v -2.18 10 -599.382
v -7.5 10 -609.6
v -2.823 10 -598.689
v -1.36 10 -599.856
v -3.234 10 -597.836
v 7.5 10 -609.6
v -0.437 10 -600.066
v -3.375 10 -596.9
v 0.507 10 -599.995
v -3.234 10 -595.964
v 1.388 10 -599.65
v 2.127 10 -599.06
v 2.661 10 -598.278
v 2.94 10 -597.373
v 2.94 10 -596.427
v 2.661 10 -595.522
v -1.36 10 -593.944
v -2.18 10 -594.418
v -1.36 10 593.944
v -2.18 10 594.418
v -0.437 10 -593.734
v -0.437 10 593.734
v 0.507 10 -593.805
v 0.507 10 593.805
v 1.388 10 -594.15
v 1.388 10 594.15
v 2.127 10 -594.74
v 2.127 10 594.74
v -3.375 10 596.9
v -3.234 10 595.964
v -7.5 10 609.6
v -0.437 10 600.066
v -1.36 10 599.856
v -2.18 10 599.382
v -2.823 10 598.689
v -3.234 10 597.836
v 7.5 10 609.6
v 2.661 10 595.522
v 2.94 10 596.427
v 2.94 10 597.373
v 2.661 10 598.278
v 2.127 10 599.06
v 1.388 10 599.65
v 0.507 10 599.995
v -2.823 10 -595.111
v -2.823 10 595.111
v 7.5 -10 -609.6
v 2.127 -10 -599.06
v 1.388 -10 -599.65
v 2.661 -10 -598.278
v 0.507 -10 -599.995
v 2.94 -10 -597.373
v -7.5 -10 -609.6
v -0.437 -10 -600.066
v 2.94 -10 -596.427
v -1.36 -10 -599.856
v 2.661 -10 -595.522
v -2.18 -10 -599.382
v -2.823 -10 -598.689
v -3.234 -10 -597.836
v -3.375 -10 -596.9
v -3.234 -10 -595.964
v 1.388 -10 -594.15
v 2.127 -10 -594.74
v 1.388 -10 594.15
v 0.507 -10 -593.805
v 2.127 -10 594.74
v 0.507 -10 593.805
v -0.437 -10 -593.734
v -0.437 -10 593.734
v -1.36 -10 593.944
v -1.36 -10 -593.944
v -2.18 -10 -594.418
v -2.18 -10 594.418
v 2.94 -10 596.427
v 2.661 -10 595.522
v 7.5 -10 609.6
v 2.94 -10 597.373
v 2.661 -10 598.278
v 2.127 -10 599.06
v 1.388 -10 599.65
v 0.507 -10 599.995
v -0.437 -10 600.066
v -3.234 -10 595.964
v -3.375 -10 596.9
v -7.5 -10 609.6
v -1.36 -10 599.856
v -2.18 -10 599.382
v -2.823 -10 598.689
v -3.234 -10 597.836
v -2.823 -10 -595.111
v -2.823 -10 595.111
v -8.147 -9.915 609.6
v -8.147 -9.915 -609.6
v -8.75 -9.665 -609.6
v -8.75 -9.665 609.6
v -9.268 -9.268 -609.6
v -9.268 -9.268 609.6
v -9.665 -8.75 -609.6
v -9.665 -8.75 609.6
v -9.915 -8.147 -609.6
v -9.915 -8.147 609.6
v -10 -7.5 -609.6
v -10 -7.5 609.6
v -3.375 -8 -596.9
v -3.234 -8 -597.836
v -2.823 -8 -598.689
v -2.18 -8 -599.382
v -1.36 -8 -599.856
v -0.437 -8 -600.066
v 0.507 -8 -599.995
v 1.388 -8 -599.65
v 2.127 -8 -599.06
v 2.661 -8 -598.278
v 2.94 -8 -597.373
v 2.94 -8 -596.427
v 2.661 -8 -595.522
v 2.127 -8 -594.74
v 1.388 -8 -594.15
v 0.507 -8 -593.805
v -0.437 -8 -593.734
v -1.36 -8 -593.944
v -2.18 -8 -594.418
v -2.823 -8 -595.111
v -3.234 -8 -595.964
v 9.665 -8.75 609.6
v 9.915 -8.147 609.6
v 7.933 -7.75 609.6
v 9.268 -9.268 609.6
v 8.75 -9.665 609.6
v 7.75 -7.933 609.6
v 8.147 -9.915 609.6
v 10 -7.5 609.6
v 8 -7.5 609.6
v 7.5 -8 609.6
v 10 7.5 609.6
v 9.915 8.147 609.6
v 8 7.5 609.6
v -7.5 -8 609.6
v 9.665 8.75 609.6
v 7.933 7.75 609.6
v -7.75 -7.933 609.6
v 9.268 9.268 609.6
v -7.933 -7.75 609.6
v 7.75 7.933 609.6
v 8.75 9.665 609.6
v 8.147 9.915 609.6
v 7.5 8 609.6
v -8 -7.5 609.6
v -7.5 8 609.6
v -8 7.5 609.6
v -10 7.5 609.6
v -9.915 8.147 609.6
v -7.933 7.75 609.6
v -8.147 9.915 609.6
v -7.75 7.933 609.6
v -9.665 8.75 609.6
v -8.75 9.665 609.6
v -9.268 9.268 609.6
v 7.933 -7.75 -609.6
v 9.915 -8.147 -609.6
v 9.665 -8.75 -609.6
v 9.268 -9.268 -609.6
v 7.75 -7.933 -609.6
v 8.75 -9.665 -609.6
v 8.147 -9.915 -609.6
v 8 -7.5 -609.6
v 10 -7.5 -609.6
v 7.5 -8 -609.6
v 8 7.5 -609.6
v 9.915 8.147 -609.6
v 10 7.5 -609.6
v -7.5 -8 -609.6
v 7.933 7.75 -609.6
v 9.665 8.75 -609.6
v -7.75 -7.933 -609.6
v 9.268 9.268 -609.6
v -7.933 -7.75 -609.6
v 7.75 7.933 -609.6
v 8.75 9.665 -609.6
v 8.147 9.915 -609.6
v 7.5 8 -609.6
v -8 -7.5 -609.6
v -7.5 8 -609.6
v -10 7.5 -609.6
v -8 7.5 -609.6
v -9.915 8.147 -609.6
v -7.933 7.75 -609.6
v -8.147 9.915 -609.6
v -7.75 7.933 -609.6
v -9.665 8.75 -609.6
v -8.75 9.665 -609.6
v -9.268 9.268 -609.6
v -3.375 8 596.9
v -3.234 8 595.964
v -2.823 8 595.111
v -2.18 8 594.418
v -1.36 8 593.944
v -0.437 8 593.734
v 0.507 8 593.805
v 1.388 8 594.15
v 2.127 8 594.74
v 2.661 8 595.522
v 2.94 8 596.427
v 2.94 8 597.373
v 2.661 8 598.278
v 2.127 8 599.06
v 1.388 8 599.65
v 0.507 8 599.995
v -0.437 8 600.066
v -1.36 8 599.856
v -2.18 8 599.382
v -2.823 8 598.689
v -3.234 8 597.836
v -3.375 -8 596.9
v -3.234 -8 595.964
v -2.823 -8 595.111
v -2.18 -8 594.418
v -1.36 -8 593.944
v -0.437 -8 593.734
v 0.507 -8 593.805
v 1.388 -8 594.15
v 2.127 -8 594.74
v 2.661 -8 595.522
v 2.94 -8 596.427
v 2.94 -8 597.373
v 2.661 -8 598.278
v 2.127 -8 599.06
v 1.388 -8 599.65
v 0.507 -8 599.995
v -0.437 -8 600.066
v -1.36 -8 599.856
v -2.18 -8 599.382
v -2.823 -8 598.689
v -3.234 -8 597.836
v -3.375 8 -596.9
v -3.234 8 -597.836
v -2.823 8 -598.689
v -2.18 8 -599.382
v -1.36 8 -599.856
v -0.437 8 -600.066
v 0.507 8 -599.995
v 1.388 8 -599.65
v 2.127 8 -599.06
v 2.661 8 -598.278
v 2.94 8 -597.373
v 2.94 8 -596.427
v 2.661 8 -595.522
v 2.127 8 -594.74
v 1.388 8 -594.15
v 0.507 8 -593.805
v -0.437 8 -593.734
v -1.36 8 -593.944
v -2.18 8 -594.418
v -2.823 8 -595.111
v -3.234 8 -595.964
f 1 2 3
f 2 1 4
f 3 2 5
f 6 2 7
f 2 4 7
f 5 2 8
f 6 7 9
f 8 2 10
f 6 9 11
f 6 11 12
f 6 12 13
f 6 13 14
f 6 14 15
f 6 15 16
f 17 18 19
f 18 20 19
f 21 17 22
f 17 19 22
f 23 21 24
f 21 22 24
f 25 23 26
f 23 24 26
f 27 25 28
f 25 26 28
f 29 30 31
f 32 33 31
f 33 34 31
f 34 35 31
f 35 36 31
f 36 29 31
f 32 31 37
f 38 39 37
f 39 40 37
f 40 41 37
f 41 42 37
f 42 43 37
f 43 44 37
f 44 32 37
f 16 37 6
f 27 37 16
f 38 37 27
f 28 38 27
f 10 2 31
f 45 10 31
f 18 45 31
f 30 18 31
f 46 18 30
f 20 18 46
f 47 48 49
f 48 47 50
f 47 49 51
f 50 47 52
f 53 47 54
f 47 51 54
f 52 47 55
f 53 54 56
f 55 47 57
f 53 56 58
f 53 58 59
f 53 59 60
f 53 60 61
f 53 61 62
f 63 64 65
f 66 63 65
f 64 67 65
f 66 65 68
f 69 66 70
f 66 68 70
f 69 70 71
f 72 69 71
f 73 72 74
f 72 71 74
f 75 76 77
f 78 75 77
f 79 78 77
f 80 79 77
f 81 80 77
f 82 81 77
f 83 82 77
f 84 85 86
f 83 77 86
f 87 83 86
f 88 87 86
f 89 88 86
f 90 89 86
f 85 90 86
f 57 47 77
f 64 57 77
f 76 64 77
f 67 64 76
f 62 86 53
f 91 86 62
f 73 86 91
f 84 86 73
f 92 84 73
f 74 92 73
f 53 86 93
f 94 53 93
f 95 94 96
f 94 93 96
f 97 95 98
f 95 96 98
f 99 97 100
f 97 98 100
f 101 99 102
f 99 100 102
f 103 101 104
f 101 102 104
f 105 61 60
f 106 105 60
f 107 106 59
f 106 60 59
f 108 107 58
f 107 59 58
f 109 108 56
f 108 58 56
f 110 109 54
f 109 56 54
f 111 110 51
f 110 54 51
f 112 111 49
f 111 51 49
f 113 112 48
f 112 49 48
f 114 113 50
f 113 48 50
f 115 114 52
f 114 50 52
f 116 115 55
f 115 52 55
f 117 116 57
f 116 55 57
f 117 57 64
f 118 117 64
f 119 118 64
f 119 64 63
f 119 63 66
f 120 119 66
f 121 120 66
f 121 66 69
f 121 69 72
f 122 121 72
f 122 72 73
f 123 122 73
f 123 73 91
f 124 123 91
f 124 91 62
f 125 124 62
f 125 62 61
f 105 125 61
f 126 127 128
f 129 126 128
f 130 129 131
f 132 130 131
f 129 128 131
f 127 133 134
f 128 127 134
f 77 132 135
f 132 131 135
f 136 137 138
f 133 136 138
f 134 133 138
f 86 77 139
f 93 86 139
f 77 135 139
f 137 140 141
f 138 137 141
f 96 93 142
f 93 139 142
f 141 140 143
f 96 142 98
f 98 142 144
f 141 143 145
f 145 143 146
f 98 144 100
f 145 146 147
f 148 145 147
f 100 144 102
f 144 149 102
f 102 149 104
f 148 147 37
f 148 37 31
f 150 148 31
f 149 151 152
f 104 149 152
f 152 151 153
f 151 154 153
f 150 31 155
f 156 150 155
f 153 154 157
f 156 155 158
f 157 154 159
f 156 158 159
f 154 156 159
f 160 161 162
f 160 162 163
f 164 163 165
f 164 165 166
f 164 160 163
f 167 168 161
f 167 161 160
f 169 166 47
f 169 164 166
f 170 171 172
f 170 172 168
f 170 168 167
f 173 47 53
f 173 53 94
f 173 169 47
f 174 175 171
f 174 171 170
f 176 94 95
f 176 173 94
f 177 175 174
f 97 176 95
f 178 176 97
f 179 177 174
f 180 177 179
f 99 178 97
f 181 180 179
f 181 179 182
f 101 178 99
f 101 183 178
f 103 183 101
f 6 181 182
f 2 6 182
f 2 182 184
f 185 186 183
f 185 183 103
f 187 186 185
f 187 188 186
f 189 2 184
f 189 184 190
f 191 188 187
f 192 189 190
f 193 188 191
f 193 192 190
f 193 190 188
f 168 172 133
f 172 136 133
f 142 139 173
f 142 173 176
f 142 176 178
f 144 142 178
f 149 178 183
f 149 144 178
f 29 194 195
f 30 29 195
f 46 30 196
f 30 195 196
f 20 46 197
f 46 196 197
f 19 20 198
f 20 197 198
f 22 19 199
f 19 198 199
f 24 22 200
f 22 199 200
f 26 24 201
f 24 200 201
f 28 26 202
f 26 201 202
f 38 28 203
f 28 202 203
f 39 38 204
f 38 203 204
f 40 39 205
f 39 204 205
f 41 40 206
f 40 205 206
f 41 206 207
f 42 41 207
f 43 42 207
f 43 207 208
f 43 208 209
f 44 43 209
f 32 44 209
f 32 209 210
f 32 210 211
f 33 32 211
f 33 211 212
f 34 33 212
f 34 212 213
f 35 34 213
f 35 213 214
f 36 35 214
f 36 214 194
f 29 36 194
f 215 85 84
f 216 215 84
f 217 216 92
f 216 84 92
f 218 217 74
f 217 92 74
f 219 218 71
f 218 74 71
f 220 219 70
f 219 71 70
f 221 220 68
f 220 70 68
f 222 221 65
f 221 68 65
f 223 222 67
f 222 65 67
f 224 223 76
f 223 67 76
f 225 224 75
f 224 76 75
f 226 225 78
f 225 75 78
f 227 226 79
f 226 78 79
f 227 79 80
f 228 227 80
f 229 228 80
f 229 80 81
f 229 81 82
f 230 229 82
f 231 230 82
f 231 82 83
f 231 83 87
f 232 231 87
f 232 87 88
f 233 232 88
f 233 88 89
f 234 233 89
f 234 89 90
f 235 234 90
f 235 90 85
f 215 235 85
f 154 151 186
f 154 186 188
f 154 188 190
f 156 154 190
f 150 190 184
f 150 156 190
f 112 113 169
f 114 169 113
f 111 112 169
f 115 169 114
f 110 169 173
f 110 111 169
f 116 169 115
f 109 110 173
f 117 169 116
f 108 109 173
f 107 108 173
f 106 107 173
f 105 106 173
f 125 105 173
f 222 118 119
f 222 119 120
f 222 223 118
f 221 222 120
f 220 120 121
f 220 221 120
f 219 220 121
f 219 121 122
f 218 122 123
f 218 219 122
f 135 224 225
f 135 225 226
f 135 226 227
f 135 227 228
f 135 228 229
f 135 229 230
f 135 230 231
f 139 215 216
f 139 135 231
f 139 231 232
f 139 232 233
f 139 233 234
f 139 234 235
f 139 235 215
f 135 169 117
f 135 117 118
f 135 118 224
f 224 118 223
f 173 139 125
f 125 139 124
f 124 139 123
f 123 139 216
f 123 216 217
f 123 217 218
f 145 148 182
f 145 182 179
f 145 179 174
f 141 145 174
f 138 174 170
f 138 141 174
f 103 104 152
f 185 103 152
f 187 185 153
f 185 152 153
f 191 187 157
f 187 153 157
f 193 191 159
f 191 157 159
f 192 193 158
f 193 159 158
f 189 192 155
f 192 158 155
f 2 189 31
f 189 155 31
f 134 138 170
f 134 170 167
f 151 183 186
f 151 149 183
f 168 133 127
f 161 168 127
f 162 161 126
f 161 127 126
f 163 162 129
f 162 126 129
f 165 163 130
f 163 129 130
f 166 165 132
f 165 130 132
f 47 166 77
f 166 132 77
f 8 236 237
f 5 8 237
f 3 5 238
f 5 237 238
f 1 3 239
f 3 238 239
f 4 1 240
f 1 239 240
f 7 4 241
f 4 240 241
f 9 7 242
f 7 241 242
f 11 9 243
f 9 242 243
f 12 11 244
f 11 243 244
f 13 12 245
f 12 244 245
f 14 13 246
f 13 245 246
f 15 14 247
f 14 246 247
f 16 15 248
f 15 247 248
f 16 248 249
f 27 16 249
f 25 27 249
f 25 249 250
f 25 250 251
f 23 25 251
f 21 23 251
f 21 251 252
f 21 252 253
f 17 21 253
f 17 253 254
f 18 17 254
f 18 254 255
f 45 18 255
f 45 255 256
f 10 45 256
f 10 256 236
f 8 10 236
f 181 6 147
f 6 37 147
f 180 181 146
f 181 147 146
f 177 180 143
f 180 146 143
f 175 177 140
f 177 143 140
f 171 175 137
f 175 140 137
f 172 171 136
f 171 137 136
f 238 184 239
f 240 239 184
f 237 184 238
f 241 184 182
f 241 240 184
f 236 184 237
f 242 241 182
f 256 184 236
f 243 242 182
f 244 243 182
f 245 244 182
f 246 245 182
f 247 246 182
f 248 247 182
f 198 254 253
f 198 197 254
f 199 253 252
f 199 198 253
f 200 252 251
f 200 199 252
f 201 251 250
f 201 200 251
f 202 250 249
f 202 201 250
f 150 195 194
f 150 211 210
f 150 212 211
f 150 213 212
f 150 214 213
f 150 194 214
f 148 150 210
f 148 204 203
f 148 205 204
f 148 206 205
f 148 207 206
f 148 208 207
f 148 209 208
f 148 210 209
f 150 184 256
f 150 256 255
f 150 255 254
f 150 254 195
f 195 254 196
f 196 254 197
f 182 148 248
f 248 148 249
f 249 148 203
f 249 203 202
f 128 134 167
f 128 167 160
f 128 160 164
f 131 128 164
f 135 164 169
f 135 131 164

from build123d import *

# Parameters (mm, degrees)
EXTRUDE_THIN1_DEPTH             = 609.6
F_1_4_0_25_DIAMETER_HOLE1_D     = 6.35
F_1_4_0_25_DIAMETER_HOLE1_DEPTH = 25.4
F_1_4_0_25_DIAMETER_HOLE1_TIP   = 1.907732465


with BuildPart() as part:
    # Sketch1 → Extrude-Thin1 (new, symmetric)
    with BuildSketch(Plane.XY):
        with BuildLine():
            Line((-10, -7.5), (-10, 7.5))
            ThreePointArc((-10, 7.5), (-9.267766953, 9.267766953), (-7.5, 10))
            Line((-7.5, 10), (7.5, 10))
            ThreePointArc((7.5, 10), (9.267766953, 9.267766953), (10, 7.5))
            Line((10, 7.5), (10, -7.5))
            ThreePointArc((10, -7.5), (9.267766953, -9.267766953), (7.5, -10))
            Line((7.5, -10), (-7.5, -10))
            ThreePointArc((-7.5, -10), (-9.267766953, -9.267766953), (-10, -7.5))
        make_face()
        with BuildLine():
            Line((-8, -7.5), (-8, 7.5))
            ThreePointArc((-8, 7.5), (-7.853553391, 7.853553391), (-7.5, 8))
            Line((-7.5, 8), (7.5, 8))
            ThreePointArc((7.5, 8), (7.853553391, 7.853553391), (8, 7.5))
            Line((8, 7.5), (8, -7.5))
            ThreePointArc((8, -7.5), (7.853553391, -7.853553391), (7.5, -8))
            Line((7.5, -8), (-7.5, -8))
            ThreePointArc((-7.5, -8), (-7.853553391, -7.853553391), (-8, -7.5))
        make_face(mode=Mode.SUBTRACT)
    extrude(amount=EXTRUDE_THIN1_DEPTH, both=True)

    # 1/4 (0.25) Diameter Hole1
    with Locations(Plane(origin=(0, 10, 0), x_dir=(1, 0, 0), z_dir=(0, 1, 0))):
        with Locations((-0.2, 596.9), (-0.2, -596.9)):
            Hole(F_1_4_0_25_DIAMETER_HOLE1_D / 2, depth=F_1_4_0_25_DIAMETER_HOLE1_DEPTH)
            with Locations((0, 0, -(F_1_4_0_25_DIAMETER_HOLE1_DEPTH + F_1_4_0_25_DIAMETER_HOLE1_TIP / 2))):  # 118° drill point
                Cone(0, F_1_4_0_25_DIAMETER_HOLE1_D / 2, F_1_4_0_25_DIAMETER_HOLE1_TIP, mode=Mode.SUBTRACT)


solid = part.part
